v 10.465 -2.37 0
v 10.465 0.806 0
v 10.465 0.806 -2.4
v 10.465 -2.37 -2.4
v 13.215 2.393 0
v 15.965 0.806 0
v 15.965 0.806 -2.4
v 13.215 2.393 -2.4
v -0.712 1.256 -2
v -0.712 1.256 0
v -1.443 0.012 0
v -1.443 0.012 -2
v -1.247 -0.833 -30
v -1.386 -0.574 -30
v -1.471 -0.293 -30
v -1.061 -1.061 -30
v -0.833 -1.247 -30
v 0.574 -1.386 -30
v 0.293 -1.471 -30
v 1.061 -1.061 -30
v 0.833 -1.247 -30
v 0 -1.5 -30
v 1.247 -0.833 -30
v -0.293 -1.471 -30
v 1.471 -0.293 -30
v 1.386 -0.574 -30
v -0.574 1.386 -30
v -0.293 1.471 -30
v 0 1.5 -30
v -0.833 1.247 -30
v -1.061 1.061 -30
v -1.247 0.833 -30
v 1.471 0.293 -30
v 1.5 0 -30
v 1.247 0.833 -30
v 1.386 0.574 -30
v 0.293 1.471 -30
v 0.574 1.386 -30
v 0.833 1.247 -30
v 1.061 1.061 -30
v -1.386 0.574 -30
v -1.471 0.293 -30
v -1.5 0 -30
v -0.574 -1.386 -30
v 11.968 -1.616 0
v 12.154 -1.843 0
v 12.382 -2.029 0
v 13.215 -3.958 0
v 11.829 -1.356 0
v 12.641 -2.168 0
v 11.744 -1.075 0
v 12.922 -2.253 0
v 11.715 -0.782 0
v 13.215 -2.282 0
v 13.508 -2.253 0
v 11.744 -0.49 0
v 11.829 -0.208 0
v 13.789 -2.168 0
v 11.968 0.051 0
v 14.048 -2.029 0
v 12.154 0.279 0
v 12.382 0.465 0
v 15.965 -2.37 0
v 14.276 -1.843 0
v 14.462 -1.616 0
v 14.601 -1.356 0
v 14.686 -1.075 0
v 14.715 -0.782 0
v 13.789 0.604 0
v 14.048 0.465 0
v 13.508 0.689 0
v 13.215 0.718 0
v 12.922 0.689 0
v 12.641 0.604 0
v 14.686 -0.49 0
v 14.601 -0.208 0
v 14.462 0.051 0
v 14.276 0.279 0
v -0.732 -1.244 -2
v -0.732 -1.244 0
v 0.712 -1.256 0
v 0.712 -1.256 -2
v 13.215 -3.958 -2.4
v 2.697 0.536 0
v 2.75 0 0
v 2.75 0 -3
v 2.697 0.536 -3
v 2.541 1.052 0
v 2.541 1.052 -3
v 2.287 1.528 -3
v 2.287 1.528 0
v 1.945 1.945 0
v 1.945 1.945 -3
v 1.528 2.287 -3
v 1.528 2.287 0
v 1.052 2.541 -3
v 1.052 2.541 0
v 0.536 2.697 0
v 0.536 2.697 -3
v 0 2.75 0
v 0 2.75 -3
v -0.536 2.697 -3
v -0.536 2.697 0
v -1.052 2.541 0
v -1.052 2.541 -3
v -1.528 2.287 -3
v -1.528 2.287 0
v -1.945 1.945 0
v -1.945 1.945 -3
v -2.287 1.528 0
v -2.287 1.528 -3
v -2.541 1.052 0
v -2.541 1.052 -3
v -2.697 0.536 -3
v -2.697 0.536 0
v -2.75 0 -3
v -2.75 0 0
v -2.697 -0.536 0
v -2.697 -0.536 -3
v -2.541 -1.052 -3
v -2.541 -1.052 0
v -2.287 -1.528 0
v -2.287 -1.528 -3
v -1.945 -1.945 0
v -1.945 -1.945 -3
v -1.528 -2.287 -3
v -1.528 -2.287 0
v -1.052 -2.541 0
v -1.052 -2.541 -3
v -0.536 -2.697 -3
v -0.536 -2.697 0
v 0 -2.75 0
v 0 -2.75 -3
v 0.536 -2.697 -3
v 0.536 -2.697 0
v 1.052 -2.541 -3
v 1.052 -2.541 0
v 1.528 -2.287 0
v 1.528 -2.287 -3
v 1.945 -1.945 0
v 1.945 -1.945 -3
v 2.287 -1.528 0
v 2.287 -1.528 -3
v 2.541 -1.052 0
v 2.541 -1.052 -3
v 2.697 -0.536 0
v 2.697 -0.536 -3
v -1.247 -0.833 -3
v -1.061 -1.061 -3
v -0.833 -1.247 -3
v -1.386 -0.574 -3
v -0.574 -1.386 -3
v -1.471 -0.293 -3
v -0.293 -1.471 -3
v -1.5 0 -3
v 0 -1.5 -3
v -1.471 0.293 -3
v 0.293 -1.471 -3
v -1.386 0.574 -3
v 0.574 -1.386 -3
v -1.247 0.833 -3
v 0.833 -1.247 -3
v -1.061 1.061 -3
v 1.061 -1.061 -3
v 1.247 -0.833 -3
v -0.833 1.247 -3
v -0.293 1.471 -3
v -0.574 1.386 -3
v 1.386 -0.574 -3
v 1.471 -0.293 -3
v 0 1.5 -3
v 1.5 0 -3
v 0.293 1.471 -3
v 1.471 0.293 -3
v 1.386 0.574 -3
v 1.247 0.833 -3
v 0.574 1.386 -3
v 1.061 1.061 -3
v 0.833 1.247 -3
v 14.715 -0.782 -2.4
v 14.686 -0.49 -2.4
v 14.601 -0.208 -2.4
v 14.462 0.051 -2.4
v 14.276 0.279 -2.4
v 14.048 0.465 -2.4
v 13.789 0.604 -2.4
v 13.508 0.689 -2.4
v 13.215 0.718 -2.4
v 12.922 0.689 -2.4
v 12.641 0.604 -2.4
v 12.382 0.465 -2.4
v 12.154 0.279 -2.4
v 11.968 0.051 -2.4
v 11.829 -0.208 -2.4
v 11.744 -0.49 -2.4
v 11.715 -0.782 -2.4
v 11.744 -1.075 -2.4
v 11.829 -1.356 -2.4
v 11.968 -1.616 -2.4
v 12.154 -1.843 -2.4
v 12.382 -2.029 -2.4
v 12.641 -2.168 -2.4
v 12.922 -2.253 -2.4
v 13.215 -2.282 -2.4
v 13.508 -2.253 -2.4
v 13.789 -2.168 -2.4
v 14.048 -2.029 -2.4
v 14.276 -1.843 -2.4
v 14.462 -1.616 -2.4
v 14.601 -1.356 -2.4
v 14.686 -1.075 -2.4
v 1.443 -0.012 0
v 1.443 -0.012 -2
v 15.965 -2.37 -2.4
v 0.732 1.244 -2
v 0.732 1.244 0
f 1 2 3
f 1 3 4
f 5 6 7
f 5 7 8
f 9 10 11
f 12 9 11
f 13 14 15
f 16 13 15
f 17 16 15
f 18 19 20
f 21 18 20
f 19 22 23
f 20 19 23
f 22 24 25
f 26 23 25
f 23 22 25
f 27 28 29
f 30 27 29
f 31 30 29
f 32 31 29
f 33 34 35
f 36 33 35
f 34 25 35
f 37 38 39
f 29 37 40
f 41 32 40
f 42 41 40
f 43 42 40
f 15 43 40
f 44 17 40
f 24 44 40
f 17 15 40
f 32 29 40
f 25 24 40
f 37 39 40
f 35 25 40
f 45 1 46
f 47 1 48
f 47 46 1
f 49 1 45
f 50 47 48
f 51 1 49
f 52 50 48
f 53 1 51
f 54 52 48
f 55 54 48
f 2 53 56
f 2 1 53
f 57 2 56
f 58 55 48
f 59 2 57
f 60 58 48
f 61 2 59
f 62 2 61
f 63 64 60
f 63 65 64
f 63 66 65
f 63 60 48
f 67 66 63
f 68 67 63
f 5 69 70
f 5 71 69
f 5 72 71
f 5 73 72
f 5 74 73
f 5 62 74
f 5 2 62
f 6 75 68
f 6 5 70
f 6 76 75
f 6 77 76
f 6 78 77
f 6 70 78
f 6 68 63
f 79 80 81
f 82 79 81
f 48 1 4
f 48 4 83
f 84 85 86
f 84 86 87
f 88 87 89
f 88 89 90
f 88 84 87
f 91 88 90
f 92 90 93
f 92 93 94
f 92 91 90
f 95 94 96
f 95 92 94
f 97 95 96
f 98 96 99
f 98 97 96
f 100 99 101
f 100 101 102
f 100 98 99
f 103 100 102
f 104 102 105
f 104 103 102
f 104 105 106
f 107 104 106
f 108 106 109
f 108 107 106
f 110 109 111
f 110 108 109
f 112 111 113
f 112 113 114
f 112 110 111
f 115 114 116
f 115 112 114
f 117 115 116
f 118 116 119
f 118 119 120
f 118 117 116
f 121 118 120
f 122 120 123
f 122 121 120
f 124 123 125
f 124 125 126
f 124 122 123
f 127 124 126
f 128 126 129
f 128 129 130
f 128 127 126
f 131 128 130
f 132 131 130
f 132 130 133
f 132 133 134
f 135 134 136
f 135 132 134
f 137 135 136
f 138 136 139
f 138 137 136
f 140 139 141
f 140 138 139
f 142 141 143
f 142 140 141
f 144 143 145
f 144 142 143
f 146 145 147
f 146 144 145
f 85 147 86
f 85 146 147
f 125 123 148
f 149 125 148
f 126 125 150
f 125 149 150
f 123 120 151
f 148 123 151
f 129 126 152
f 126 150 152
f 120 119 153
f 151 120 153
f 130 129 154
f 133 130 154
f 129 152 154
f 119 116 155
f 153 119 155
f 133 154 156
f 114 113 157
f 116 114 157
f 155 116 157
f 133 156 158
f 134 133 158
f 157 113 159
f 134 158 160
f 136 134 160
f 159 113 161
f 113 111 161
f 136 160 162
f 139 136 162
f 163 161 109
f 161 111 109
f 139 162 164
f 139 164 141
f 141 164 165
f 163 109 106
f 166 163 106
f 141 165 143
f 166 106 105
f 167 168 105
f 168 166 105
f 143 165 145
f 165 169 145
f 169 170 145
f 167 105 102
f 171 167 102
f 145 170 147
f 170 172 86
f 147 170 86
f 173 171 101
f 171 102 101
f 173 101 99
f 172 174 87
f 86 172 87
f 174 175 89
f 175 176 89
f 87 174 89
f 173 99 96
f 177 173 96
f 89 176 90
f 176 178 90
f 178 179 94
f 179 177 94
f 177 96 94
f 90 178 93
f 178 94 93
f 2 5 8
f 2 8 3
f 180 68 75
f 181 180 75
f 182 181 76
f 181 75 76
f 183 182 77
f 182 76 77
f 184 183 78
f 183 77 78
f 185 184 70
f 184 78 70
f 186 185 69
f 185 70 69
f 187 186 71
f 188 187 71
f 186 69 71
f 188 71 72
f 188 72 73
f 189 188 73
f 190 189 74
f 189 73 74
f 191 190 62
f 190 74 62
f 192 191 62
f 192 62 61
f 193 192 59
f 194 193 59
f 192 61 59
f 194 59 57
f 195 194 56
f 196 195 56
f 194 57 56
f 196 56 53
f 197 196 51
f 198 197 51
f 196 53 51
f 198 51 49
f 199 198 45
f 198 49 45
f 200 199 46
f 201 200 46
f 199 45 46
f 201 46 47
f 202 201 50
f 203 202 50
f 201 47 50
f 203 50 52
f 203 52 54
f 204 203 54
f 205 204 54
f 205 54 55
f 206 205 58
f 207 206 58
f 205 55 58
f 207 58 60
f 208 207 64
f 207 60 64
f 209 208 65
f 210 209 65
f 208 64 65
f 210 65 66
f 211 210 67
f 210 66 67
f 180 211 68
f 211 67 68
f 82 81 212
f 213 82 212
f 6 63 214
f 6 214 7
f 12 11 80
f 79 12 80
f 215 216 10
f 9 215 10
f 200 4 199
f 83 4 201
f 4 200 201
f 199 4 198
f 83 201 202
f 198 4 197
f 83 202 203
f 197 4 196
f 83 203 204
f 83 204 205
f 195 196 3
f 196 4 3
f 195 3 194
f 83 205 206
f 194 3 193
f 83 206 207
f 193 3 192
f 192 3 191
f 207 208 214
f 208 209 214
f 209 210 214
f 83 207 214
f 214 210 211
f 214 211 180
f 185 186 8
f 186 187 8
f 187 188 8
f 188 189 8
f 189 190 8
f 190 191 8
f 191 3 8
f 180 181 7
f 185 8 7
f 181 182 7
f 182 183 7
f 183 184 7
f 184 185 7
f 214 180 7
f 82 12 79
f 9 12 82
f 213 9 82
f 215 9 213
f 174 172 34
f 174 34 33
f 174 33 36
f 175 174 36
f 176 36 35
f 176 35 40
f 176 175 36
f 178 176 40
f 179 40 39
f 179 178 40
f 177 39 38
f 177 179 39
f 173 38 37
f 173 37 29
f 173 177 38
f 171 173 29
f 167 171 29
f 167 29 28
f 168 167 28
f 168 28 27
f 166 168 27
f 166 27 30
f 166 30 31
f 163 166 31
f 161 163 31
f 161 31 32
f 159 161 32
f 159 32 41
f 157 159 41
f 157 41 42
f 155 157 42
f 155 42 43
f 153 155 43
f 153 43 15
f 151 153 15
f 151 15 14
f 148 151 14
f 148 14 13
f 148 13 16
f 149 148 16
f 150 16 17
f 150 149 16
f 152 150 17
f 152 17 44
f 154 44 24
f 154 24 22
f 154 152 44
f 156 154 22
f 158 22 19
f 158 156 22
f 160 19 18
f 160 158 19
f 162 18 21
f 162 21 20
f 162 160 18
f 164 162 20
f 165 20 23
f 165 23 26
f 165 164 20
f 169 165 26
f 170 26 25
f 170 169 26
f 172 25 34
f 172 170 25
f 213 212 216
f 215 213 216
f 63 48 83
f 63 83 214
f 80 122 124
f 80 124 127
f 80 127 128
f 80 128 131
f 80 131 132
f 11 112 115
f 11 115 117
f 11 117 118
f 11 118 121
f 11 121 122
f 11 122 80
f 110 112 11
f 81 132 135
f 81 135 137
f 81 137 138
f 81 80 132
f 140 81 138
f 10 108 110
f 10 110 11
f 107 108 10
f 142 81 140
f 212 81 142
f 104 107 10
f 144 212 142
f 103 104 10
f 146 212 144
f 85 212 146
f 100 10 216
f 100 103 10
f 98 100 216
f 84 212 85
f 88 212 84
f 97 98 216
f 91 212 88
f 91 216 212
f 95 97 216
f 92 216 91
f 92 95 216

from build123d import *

# Parameters (mm, degrees)
F0_R     = 2.75
F3_DEPTH = 3
F1_R     = 1.5
F4_DEPTH = 30
F5_DEPTH = 2
F6_R     = 1.5
F7_DEPTH = 2.4


with BuildPart() as f3:
    # F0 (on Top) → F3 (new body)
    with BuildSketch(Plane.XY):
        Circle(F0_R)
    extrude(amount=-F3_DEPTH)

    # F1 (on Top) → F4 (join)
    with BuildSketch(Plane.XY):
        Circle(F1_R)
    extrude(amount=-F4_DEPTH)

    # F2 (on Top) → F5 (cut)
    with BuildSketch(Plane.XY):
        Polygon((-0.711696, 1.255716), (-1.44333, 0.011511), (-0.731634, -1.244205), (0.711696, -1.255716), (1.44333, -0.011511), (0.731634, 1.244205), align=None)
    extrude(amount=-F5_DEPTH, mode=Mode.SUBTRACT)


with BuildPart() as f7:
    # F6 (on Top) → F7 (new body)
    with BuildSketch(Plane.XY):
        Polygon((10.465095, 0.805562), (10.465095, -2.369865), (13.215095, -3.957578), (15.965095, -2.369865), (15.965095, 0.805562), (13.215095, 2.393275), align=None)
        with Locations((13.215095, -0.782151)):
            Circle(F6_R, mode=Mode.SUBTRACT)
    extrude(amount=-F7_DEPTH)


solid = Compound([f3.part, f7.part])
